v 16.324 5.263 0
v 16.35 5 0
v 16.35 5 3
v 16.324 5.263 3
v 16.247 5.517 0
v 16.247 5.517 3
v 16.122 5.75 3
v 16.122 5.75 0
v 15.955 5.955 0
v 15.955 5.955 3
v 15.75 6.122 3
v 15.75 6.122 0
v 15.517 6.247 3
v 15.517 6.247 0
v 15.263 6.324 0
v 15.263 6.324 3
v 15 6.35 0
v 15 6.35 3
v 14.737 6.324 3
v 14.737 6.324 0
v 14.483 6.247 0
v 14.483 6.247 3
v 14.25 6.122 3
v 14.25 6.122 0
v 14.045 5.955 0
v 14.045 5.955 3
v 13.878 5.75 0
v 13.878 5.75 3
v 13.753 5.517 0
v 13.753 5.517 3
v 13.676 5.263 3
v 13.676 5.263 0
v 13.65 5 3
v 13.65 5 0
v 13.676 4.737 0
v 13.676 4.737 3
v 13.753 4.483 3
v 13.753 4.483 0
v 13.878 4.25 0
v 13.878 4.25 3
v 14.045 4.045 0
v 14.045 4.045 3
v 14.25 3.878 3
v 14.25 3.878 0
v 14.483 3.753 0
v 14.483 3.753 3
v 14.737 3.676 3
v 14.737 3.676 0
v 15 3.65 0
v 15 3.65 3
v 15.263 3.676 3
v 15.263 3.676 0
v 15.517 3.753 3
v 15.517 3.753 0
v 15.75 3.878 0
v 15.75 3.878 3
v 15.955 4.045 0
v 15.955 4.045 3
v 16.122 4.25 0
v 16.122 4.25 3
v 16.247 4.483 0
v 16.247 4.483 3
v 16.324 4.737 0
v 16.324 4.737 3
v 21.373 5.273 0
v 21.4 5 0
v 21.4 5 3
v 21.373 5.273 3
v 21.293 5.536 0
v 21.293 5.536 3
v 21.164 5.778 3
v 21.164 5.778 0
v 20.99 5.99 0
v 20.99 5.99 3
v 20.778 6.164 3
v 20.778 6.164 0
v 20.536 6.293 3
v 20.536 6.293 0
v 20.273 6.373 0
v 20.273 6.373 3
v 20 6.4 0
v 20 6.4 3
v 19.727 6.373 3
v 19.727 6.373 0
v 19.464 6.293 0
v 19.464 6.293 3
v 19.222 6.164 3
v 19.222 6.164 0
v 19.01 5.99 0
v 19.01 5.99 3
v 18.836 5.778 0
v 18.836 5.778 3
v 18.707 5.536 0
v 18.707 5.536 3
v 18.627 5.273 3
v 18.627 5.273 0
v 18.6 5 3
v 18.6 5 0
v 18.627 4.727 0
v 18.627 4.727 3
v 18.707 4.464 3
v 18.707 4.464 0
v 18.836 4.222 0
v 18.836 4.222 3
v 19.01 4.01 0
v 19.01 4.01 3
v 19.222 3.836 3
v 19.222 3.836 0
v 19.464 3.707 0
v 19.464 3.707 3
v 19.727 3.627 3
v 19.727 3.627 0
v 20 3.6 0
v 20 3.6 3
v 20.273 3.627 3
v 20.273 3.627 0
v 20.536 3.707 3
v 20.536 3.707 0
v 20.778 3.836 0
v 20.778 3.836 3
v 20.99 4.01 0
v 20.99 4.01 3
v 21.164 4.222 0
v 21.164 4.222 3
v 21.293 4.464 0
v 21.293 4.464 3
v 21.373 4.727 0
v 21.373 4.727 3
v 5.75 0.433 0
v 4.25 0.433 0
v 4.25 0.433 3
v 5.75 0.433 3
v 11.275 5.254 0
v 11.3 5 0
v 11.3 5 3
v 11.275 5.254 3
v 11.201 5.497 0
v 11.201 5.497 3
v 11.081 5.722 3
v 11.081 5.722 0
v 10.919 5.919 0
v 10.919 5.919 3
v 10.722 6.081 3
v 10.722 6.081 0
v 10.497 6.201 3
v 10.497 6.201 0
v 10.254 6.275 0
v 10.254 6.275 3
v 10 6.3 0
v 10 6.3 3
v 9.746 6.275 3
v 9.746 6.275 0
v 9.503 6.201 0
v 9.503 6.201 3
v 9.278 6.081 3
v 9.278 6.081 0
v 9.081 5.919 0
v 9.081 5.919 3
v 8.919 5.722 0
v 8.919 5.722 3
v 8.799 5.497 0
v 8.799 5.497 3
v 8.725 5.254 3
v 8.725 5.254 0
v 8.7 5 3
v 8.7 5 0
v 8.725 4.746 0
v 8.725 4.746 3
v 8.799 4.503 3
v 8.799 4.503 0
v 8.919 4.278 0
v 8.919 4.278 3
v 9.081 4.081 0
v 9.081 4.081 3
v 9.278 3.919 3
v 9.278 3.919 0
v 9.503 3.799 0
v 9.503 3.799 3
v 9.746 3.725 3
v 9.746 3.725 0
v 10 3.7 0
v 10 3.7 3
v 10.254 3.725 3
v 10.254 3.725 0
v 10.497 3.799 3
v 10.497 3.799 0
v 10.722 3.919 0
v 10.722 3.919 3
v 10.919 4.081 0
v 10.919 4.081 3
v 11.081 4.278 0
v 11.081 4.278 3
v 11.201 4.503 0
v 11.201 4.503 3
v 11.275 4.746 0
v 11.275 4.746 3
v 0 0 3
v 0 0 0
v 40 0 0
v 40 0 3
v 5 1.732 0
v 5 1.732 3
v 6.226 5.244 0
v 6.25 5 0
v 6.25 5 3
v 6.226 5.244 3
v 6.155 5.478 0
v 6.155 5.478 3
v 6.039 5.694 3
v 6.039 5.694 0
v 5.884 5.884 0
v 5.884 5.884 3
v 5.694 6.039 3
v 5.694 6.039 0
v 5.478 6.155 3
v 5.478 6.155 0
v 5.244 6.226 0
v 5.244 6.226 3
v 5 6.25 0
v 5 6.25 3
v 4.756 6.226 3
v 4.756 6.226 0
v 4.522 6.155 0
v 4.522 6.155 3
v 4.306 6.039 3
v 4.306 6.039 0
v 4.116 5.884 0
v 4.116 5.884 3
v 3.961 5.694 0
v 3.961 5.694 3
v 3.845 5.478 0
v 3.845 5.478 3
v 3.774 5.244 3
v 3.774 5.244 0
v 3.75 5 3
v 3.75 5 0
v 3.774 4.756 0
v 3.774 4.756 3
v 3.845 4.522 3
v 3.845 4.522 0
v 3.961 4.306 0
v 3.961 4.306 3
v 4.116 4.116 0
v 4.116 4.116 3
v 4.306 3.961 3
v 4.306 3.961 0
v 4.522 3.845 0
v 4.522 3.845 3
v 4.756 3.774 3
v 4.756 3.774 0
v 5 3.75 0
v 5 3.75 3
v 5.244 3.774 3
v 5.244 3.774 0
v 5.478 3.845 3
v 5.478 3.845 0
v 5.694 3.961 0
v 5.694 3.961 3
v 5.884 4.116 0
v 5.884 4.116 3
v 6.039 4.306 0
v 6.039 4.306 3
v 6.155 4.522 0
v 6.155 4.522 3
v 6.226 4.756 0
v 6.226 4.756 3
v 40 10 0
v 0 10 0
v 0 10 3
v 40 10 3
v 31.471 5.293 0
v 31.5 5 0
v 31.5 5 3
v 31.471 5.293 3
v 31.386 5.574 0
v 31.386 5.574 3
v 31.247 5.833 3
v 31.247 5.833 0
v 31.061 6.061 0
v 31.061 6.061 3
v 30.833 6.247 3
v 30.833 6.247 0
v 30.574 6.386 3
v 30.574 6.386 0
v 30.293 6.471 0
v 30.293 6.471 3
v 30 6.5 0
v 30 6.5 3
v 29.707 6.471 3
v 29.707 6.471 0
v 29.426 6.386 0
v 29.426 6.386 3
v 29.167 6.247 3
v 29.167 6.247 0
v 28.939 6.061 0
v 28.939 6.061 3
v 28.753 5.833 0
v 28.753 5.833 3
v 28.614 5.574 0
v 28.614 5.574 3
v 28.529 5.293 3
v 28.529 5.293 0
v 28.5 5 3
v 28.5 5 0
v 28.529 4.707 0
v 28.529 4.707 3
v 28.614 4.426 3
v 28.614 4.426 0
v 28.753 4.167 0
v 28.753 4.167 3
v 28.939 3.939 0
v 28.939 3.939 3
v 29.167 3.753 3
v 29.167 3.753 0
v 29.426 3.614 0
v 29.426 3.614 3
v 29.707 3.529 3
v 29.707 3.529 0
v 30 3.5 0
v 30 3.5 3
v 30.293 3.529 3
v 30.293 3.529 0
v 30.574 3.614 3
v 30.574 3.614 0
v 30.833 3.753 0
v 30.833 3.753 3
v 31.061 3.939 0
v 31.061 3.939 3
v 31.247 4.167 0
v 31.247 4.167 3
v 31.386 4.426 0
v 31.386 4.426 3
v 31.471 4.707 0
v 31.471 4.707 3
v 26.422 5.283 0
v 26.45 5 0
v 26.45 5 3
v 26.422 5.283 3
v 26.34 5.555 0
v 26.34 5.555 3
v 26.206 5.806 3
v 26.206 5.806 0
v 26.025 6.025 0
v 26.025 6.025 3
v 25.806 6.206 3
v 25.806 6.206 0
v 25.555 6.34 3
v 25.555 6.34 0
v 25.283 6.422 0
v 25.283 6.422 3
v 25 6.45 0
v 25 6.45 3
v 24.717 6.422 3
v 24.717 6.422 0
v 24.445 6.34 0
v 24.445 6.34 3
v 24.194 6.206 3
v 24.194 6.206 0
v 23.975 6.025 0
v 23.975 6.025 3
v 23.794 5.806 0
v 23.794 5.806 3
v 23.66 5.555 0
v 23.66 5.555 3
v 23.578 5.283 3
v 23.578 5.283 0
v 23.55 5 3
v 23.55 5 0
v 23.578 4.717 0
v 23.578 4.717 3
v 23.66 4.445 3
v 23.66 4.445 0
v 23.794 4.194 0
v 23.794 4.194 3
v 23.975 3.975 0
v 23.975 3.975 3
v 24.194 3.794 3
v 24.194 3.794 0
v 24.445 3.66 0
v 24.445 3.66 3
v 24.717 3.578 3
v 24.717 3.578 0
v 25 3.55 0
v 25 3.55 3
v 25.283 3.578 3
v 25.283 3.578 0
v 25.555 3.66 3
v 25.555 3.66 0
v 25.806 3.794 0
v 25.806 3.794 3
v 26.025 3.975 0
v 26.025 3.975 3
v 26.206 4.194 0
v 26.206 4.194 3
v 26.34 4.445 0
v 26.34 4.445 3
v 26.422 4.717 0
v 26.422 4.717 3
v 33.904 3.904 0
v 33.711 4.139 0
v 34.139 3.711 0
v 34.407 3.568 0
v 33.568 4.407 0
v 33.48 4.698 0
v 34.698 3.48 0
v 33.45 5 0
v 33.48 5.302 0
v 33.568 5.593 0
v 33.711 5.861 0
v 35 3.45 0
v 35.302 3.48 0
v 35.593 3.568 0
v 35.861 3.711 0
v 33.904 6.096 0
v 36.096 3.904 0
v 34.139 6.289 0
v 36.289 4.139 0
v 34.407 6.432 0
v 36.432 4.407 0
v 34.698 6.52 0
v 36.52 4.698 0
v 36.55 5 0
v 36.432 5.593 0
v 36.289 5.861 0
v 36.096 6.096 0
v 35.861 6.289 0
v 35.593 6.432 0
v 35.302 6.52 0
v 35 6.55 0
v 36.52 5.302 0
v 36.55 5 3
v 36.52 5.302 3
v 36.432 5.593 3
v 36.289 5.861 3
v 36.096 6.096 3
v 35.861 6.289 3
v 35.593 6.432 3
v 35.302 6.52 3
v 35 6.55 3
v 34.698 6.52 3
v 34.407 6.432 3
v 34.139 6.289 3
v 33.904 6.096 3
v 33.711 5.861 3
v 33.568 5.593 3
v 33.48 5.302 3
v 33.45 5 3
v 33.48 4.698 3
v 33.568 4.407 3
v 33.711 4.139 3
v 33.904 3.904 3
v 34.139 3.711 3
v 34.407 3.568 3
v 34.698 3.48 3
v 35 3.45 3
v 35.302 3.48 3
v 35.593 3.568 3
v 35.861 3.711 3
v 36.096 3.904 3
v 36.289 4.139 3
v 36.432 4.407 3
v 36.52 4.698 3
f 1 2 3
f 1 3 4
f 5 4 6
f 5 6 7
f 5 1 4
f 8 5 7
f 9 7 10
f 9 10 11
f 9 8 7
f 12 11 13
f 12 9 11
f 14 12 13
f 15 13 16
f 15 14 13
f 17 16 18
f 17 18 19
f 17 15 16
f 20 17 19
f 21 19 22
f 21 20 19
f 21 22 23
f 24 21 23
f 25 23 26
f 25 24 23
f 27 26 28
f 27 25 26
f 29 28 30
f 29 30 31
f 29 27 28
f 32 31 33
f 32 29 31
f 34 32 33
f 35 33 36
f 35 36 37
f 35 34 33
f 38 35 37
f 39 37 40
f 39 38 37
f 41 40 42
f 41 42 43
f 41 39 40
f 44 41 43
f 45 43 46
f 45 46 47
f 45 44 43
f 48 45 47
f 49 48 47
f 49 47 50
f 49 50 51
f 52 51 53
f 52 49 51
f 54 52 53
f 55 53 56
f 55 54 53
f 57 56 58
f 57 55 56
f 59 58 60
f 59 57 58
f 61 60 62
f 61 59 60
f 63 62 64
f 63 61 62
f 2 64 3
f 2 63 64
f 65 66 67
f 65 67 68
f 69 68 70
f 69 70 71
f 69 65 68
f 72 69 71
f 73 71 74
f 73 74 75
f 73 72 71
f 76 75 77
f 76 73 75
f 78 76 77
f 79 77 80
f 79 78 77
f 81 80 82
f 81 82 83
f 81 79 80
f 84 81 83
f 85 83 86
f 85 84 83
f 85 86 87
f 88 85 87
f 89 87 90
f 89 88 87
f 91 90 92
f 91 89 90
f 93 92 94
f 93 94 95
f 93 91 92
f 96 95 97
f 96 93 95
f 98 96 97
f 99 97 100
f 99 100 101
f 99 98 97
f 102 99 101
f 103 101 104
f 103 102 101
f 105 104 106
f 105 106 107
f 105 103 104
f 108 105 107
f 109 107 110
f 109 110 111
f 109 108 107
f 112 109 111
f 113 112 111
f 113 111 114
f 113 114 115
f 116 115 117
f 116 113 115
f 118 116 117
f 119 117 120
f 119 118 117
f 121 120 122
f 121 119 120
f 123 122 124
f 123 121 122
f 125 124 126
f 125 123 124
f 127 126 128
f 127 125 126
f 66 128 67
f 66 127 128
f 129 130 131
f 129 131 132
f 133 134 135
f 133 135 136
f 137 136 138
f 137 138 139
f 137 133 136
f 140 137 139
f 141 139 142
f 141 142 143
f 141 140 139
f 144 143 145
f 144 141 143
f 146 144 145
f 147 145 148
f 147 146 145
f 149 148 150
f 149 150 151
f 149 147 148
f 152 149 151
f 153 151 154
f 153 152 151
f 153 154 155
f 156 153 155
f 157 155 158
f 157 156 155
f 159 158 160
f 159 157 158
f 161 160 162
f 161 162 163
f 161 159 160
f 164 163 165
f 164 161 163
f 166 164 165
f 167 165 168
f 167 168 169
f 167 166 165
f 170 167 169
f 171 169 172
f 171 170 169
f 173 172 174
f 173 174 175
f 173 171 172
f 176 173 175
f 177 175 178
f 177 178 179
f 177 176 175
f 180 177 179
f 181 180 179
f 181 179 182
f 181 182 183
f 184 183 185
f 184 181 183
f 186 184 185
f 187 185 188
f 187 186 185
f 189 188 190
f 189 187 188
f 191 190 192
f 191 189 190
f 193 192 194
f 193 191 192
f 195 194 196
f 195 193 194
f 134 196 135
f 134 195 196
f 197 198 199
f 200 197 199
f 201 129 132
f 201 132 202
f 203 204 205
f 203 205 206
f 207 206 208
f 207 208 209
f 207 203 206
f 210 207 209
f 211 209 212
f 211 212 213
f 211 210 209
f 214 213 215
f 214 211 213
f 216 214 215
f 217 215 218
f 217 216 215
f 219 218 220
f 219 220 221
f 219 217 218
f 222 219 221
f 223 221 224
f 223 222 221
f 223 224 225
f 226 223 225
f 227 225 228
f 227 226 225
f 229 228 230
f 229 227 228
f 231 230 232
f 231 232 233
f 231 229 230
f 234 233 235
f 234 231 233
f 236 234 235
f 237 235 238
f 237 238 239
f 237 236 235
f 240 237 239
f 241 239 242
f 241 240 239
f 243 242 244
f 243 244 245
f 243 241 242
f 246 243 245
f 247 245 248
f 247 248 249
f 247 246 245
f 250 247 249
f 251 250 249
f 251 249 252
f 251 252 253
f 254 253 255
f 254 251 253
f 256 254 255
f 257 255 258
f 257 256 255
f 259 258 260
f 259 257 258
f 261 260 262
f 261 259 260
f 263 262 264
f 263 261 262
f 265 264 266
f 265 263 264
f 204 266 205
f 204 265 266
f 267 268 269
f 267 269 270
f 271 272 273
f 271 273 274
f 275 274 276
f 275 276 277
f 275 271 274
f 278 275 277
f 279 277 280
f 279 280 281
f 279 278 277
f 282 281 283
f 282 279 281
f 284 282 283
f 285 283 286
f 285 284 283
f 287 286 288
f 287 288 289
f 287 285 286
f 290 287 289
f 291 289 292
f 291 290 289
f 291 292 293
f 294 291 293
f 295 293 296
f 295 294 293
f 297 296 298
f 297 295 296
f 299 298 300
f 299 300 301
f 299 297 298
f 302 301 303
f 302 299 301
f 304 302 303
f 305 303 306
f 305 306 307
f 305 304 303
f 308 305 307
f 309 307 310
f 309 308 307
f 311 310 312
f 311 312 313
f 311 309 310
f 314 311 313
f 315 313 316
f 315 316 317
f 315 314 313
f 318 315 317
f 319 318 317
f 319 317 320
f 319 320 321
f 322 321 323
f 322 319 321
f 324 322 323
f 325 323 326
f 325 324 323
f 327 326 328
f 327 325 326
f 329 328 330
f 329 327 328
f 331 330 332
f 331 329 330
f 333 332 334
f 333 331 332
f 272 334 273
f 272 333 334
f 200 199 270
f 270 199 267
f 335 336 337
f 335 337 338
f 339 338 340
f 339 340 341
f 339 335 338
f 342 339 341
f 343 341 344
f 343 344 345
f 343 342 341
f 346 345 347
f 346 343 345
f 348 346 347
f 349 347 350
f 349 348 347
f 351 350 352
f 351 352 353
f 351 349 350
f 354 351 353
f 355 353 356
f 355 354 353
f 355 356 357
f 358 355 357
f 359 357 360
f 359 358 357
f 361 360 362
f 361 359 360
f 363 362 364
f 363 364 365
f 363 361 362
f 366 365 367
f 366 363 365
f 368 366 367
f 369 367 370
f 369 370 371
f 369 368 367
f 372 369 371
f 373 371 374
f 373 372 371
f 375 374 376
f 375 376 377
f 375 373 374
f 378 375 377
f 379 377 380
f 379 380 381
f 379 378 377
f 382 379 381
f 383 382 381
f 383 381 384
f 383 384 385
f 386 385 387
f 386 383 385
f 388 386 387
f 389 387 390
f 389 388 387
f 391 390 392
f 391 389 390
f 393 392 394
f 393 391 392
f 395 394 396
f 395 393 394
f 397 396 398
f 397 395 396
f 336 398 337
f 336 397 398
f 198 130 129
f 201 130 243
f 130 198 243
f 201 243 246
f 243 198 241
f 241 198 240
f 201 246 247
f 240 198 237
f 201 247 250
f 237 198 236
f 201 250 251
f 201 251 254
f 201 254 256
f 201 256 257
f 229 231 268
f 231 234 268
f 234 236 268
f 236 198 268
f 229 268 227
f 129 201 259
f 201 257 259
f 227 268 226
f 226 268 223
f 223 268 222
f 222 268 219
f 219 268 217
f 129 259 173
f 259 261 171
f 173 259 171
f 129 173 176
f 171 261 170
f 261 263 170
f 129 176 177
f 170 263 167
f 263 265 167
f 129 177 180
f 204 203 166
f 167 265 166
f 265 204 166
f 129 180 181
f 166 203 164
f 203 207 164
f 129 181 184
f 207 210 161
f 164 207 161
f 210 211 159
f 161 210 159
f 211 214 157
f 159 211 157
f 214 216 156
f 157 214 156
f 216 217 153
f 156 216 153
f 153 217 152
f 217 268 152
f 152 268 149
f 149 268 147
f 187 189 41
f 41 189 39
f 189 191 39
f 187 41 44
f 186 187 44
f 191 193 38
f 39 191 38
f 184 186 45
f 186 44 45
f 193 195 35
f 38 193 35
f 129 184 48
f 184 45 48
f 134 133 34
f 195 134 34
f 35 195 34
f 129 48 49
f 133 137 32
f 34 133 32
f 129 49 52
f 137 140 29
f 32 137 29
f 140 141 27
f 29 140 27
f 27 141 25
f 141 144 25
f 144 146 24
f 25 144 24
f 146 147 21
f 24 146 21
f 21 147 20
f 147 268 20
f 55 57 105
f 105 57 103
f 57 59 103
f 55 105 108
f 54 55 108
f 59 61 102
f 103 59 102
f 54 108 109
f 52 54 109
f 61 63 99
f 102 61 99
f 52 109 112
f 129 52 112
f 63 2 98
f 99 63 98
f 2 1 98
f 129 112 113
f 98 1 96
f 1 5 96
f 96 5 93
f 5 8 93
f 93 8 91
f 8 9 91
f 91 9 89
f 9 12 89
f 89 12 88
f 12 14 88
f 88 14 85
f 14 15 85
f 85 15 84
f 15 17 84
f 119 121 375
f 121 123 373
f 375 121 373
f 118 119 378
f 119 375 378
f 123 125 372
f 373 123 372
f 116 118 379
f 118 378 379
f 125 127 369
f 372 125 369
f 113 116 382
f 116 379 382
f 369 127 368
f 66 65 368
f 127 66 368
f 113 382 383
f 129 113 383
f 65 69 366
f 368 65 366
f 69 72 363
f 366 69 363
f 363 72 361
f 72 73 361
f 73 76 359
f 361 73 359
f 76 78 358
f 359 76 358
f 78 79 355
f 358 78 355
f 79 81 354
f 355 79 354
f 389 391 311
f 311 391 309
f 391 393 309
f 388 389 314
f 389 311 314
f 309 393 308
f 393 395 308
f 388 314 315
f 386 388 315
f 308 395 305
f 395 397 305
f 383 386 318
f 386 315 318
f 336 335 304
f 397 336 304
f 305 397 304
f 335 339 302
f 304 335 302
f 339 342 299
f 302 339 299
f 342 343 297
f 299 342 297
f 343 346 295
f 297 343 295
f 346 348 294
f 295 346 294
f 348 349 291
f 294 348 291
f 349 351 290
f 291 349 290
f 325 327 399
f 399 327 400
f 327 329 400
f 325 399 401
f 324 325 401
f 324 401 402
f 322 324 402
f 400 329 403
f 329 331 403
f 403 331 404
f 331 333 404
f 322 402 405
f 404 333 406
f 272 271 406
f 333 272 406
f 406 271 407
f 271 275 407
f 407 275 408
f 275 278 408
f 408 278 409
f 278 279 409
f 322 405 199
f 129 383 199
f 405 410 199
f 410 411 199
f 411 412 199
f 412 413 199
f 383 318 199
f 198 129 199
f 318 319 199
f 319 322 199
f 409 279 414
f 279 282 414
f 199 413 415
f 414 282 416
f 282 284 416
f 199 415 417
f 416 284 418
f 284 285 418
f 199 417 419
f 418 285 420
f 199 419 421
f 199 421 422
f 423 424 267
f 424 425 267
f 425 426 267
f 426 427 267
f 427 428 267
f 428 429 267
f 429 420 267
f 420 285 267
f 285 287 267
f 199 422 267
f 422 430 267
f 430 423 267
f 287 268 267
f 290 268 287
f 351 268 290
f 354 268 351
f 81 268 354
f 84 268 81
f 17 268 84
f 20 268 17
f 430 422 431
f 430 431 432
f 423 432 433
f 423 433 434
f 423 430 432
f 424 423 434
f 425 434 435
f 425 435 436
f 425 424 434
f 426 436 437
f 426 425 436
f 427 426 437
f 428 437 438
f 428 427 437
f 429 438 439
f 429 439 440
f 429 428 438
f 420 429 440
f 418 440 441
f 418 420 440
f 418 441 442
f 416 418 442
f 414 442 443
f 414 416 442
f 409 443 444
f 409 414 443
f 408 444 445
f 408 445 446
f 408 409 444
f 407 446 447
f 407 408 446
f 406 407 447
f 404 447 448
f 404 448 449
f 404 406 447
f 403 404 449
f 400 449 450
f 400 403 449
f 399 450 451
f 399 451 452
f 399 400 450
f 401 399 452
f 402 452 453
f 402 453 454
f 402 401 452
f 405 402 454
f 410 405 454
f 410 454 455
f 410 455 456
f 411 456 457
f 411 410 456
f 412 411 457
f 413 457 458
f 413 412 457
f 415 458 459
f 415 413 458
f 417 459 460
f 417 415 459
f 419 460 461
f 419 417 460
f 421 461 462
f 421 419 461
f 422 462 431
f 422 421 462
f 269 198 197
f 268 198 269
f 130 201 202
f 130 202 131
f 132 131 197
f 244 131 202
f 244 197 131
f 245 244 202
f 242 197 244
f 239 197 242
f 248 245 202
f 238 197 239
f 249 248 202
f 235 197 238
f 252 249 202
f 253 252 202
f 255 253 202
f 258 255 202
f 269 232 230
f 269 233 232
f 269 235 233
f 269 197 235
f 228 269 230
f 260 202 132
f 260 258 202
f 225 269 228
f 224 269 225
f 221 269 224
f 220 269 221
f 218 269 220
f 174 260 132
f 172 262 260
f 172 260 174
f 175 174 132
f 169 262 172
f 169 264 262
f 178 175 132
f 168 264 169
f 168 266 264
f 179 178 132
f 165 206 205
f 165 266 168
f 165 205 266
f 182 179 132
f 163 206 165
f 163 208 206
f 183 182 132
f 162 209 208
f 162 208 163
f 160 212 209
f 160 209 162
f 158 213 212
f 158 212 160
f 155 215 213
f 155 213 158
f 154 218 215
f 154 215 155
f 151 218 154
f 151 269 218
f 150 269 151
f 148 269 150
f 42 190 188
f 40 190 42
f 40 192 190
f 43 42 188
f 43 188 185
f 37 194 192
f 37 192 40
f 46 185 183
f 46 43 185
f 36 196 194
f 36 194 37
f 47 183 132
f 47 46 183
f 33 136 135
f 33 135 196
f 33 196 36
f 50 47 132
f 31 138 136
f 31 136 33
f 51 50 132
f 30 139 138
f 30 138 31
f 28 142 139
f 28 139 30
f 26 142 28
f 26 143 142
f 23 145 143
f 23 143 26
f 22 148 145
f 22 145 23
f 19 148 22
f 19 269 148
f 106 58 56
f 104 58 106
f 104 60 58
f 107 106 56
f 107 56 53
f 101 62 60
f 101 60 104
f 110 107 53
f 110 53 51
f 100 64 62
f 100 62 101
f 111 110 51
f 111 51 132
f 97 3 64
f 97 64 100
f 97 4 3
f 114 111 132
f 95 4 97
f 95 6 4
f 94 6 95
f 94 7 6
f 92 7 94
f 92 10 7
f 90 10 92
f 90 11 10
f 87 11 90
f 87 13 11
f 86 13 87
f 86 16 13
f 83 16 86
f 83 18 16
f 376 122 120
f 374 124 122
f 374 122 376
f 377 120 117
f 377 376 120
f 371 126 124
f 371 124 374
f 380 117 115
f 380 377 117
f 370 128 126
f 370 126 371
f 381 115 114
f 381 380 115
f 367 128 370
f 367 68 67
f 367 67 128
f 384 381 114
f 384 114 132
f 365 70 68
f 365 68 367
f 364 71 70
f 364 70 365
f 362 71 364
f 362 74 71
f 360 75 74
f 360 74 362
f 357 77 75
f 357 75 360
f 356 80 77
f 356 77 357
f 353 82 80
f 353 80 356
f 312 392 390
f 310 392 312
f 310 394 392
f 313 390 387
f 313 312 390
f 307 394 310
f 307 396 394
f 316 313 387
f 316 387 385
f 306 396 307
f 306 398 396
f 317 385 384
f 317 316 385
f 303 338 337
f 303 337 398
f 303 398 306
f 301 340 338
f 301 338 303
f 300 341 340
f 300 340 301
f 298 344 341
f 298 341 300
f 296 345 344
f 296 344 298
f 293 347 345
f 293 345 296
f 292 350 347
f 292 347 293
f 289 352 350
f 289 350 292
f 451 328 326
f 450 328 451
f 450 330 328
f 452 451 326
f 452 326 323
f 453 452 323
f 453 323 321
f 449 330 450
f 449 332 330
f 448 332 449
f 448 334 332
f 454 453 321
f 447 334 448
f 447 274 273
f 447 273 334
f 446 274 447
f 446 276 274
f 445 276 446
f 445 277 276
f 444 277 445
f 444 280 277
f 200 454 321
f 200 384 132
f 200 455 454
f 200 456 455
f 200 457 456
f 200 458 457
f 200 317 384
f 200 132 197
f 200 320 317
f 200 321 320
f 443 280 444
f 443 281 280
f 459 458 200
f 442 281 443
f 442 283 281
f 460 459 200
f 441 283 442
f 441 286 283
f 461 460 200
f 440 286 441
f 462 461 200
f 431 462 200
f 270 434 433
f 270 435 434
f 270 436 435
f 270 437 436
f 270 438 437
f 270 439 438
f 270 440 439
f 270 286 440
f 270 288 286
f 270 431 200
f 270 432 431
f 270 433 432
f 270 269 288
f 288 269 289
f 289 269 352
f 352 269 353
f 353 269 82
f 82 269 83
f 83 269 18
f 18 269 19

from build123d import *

# Parameters (mm, degrees)
SKETCH_W   = 40
SKETCH_H   = 10
SKETCH_R   = 1.25
SKETCH_R_2 = 1.35
SKETCH_R_3 = 1.3
SKETCH_R_4 = 1.4
SKETCH_R_5 = 1.45
SKETCH_R_6 = 1.5
SKETCH_R_7 = 1.55
PAD_DEPTH  = 3


with BuildPart() as part:
    # Sketch → Pad (new body)
    with BuildSketch(Plane.XY):
        with Locations((20, 5)):
            Rectangle(SKETCH_W, SKETCH_H)
        with Locations((5, 5)):
            Circle(SKETCH_R, mode=Mode.SUBTRACT)
        with Locations((15, 5)):
            Circle(SKETCH_R_2, mode=Mode.SUBTRACT)
        with Locations((10, 5)):
            Circle(SKETCH_R_3, mode=Mode.SUBTRACT)
        with Locations((20, 5)):
            Circle(SKETCH_R_4, mode=Mode.SUBTRACT)
        with Locations((25, 5)):
            Circle(SKETCH_R_5, mode=Mode.SUBTRACT)
        with Locations((30, 5)):
            Circle(SKETCH_R_6, mode=Mode.SUBTRACT)
        with Locations((35, 5)):
            Circle(SKETCH_R_7, mode=Mode.SUBTRACT)
        Polygon((4.25, 0.433013), (5.75, 0.433013), (5, 1.732051), align=None, mode=Mode.SUBTRACT)
    extrude(amount=PAD_DEPTH)


solid = part.part
